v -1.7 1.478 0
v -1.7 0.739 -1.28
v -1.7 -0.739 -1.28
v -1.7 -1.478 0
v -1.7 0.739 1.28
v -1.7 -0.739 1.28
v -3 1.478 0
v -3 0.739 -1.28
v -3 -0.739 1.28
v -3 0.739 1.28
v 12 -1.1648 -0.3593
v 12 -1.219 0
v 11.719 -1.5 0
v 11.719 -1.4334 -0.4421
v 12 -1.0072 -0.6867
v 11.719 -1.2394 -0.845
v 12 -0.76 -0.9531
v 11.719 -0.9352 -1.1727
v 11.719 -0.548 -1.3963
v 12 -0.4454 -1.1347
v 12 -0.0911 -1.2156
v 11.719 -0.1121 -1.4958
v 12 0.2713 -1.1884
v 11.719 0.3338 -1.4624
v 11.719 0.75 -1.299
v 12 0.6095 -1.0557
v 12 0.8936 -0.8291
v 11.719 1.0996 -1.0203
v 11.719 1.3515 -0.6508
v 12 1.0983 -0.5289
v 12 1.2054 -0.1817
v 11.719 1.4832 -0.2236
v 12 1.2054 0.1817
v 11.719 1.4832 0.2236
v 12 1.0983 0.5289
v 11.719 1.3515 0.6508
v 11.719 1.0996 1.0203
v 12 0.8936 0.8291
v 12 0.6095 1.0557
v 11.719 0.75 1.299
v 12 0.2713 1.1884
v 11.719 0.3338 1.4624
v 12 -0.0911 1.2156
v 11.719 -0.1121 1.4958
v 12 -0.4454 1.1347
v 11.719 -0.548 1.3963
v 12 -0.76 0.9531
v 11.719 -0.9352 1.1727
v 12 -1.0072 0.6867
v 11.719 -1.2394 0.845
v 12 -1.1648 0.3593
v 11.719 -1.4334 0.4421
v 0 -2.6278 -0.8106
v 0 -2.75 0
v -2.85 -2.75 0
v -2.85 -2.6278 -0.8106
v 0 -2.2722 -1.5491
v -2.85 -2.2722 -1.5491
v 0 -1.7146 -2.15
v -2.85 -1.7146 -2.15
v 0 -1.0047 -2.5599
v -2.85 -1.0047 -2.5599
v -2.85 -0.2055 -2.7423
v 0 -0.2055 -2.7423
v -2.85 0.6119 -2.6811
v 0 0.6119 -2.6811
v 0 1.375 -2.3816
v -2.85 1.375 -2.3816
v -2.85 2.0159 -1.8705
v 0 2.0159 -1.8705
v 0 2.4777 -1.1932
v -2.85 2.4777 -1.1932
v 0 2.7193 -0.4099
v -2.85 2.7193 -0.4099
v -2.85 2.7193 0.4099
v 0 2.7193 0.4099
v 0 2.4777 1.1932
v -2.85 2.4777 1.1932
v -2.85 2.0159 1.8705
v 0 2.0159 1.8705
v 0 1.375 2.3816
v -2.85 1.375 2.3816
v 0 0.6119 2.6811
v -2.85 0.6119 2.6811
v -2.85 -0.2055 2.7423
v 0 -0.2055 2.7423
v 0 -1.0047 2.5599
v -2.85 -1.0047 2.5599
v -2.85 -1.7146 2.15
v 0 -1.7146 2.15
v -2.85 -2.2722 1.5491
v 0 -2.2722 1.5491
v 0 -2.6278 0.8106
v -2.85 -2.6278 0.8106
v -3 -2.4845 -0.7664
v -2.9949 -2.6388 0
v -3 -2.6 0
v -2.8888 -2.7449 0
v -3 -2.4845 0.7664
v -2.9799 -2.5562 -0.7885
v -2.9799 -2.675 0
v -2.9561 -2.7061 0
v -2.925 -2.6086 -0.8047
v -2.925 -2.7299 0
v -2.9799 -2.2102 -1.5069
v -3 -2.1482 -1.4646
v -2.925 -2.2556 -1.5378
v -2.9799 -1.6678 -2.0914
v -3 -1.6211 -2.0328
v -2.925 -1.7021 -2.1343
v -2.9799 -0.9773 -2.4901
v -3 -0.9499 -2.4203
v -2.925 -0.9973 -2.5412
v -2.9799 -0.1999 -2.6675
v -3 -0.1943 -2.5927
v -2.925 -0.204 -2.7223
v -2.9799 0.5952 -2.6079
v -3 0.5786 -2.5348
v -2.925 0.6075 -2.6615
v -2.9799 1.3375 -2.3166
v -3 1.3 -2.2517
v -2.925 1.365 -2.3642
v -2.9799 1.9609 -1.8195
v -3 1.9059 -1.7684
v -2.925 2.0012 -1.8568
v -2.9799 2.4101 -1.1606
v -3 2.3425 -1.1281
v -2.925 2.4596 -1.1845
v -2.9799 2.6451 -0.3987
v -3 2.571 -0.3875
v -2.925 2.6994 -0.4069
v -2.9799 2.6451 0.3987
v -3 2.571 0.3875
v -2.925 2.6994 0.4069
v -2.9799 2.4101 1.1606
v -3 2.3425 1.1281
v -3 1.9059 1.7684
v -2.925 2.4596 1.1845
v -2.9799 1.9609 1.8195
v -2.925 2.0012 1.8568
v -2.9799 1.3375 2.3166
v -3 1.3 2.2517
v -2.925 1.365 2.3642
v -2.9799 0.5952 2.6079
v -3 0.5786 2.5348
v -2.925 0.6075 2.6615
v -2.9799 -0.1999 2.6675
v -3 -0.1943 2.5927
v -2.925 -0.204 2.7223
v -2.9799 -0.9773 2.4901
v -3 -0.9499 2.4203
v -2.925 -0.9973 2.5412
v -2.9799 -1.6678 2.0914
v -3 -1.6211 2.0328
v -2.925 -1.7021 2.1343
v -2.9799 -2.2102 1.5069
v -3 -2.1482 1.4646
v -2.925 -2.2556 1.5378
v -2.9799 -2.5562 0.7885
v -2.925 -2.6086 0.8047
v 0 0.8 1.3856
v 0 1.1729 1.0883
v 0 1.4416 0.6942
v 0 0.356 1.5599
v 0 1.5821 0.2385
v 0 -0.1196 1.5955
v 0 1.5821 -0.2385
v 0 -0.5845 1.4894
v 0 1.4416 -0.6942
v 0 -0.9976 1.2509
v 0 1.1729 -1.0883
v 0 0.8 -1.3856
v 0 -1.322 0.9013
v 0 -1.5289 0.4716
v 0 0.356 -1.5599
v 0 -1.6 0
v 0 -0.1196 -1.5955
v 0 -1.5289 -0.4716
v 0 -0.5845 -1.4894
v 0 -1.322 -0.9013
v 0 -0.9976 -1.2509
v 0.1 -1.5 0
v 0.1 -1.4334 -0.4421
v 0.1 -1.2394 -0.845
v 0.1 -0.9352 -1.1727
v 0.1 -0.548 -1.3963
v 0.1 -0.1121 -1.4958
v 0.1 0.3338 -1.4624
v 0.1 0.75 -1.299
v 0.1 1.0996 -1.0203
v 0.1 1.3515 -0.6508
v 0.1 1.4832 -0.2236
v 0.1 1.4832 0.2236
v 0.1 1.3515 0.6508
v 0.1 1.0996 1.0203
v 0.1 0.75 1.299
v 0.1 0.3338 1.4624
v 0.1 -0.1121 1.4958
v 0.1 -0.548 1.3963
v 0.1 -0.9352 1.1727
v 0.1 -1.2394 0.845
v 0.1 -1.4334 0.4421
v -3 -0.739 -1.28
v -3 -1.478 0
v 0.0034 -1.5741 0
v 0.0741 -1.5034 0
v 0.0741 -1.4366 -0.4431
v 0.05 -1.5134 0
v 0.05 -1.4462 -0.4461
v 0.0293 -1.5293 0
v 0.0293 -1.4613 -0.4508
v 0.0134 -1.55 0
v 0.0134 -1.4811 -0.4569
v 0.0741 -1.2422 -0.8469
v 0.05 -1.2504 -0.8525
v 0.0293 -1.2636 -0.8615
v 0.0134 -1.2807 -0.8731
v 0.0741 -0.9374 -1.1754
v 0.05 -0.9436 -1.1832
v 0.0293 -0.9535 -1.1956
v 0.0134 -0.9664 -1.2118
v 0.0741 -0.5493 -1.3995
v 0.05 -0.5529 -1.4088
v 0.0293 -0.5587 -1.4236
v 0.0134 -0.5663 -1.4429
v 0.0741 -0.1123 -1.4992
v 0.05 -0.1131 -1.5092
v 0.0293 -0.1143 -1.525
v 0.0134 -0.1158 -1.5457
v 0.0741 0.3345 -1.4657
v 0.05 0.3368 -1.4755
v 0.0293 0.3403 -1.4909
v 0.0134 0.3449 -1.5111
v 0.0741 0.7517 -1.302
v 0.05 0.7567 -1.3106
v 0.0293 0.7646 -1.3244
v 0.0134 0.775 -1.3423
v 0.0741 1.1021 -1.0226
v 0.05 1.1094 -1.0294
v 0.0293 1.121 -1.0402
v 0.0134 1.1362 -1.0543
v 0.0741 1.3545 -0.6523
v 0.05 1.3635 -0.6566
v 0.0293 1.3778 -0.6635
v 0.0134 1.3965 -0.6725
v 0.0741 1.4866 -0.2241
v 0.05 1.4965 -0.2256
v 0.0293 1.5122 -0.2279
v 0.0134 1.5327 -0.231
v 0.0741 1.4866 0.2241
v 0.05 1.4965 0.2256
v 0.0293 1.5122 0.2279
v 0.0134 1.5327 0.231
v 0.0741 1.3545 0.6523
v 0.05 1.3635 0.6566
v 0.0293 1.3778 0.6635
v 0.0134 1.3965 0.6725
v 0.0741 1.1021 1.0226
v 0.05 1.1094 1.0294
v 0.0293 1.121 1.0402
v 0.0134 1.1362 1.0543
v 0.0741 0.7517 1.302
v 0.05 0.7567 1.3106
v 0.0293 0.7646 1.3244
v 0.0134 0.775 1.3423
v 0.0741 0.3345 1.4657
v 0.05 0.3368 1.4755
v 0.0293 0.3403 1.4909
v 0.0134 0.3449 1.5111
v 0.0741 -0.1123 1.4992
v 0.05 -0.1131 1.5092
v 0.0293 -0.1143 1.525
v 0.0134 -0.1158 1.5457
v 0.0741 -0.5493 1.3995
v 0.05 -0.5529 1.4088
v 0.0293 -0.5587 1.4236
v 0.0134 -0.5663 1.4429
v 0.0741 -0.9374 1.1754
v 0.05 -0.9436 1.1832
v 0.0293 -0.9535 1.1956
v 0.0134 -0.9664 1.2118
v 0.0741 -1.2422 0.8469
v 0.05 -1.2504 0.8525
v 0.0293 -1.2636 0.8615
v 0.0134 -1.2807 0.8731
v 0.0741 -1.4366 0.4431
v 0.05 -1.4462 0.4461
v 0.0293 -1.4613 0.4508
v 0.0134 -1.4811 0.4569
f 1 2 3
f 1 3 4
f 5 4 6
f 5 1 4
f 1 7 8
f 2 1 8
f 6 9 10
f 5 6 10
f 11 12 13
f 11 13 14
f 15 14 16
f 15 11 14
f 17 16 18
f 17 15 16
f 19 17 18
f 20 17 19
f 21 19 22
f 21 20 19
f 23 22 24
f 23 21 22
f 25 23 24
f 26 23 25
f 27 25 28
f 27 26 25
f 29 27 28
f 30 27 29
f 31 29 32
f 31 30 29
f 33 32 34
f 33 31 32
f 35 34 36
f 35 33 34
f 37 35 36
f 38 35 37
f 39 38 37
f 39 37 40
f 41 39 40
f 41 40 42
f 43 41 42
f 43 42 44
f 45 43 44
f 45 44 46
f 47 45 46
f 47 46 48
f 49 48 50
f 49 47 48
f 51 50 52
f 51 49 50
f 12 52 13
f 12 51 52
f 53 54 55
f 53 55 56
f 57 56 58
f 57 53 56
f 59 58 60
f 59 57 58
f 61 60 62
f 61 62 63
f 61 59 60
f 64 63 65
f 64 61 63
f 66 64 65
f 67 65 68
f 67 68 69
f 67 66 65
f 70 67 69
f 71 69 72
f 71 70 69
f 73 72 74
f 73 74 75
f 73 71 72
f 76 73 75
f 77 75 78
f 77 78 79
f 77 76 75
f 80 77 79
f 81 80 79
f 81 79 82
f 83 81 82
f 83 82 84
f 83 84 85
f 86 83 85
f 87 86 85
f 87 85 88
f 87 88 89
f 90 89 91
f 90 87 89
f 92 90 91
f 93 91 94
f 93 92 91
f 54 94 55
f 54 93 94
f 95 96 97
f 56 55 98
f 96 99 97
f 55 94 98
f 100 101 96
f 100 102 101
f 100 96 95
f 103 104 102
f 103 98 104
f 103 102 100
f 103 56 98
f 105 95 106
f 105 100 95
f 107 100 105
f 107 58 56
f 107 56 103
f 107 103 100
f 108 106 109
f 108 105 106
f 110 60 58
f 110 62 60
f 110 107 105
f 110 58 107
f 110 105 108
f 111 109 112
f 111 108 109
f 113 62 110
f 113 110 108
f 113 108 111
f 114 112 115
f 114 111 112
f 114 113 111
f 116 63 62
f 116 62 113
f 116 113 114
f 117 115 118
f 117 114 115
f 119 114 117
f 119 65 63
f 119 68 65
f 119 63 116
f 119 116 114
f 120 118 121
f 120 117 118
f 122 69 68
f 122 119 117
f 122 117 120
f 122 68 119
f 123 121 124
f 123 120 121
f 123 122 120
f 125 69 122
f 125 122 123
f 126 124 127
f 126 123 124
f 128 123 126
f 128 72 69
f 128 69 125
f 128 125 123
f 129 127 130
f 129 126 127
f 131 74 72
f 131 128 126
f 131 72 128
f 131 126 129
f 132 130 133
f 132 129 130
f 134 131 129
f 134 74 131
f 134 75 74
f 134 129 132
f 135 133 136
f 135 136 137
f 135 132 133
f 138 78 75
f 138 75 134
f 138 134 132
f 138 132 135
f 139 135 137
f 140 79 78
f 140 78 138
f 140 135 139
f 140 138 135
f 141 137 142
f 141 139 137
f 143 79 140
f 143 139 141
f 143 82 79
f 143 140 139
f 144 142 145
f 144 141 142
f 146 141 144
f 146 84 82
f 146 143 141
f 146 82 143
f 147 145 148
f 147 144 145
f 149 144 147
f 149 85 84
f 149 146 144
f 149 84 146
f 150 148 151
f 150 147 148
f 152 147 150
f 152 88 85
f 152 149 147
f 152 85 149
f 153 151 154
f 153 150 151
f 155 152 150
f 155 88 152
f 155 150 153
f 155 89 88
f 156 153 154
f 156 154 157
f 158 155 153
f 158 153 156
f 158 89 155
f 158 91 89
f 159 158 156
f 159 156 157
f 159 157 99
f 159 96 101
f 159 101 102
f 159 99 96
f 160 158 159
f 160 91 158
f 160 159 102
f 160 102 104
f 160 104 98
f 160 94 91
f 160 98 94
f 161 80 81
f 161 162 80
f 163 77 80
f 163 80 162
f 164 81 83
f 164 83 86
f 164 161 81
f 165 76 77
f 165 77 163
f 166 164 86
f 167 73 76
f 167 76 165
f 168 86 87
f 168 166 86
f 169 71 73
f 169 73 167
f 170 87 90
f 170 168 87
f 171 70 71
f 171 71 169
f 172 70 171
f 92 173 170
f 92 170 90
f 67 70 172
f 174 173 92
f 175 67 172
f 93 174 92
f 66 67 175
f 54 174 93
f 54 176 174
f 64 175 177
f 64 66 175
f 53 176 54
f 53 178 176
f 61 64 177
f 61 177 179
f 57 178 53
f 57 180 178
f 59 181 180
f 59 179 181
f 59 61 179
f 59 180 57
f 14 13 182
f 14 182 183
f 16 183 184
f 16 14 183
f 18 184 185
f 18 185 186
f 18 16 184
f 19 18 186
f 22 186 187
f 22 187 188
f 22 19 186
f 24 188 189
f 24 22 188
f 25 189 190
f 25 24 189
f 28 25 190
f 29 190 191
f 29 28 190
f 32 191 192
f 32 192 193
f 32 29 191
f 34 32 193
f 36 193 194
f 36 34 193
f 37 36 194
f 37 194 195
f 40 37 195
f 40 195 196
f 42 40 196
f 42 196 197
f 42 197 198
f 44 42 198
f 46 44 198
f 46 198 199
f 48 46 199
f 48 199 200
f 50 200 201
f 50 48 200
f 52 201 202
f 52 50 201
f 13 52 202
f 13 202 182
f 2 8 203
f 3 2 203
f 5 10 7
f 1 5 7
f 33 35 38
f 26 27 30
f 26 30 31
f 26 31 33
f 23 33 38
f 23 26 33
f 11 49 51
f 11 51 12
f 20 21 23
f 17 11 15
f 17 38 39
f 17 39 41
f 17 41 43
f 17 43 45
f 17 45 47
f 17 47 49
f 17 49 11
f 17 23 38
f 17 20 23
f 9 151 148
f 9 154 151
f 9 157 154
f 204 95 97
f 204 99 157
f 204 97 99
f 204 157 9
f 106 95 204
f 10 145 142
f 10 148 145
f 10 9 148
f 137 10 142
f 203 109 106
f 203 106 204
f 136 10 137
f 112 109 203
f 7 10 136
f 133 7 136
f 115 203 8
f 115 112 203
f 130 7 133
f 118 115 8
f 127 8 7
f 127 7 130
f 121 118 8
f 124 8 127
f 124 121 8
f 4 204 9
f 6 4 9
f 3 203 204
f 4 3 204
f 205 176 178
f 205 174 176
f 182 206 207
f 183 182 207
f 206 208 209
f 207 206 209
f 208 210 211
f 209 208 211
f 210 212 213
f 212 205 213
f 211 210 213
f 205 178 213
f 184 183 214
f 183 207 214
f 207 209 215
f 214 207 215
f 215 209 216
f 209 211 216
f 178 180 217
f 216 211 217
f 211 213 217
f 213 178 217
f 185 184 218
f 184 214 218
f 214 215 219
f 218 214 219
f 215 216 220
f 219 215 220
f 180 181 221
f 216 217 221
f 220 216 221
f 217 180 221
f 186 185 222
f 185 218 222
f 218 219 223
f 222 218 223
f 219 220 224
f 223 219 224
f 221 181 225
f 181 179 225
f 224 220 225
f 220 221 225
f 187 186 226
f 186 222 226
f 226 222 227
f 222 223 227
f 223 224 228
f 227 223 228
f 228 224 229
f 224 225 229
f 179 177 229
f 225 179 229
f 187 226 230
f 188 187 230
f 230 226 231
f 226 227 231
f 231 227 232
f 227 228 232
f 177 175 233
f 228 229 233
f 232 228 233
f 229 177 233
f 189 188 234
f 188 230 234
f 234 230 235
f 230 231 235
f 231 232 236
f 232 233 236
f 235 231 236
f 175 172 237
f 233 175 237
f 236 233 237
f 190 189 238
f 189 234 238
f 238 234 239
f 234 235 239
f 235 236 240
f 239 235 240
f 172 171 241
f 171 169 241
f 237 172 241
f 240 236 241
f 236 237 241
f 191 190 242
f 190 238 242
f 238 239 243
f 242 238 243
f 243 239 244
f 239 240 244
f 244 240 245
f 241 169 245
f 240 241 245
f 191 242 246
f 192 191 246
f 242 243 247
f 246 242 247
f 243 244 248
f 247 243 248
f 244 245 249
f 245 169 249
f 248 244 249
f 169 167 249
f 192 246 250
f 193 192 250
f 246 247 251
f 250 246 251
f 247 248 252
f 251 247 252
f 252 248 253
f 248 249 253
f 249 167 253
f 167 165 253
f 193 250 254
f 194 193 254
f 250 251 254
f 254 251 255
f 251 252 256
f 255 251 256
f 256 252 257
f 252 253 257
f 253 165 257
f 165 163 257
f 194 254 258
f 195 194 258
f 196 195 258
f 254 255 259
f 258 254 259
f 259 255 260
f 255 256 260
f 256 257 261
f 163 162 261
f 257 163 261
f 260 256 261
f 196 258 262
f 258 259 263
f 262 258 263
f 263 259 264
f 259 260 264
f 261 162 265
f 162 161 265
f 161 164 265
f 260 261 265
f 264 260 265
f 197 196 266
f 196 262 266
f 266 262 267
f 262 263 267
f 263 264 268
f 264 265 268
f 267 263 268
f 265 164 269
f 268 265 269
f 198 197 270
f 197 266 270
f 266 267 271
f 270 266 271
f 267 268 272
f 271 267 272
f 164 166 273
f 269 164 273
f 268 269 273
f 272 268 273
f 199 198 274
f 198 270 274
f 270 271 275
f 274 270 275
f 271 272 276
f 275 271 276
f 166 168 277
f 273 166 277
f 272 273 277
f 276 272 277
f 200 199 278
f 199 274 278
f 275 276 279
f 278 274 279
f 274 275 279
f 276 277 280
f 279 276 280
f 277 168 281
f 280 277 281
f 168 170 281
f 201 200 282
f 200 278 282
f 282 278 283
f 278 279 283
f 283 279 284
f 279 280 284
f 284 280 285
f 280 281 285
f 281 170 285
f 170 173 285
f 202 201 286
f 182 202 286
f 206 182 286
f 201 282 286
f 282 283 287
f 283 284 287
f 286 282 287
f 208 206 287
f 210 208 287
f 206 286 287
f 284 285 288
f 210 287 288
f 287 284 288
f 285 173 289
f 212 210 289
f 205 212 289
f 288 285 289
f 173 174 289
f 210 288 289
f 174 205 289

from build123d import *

# Parameters (mm, degrees)
CUT_EXTRUDE1_DEPTH = 1.3
FILLET1_R          = 0.15
CHAMFER1_SIZE      = 0.281
FILLET2_R          = 0.1


with BuildPart() as part:
    # Sketch1 → Revolve1 (revolve)
    with BuildSketch(Plane.XY):
        Polygon((-3, 0), (-3, 2.75), (0, 2.75), (0, 1.5), (12, 1.5), (12, 0), align=None)
    revolve(axis=Axis((0, 0, 0), (1, 0, 0)))

    # Sketch2 → Cut-Extrude1 (cut)
    with BuildSketch(Plane.ZY.offset(3)):
        Polygon((0, 1.478016689), (-1.28, 0.739008345), (-1.28, -0.739008345), (0, -1.478016689), (1.28, -0.739008345), (1.28, 0.739008345), align=None)
    extrude(amount=-CUT_EXTRUDE1_DEPTH, mode=Mode.SUBTRACT)

    # Fillet1
    fillet1_edges = [part.edges().sort_by_distance(p)[0] for p in [
        (-3, -2.75, 0),
    ]]
    fillet(fillet1_edges, radius=FILLET1_R)

    # Chamfer1
    chamfer1_edges = [part.edges().sort_by_distance(p)[0] for p in [
        (12, -1.5, 0),
    ]]
    chamfer(chamfer1_edges, length=CHAMFER1_SIZE)

    # Fillet2
    fillet2_edges = [part.edges().sort_by_distance(p)[0] for p in [
        (0, -1.5, 0),
    ]]
    fillet(fillet2_edges, radius=FILLET2_R)


solid = part.part
